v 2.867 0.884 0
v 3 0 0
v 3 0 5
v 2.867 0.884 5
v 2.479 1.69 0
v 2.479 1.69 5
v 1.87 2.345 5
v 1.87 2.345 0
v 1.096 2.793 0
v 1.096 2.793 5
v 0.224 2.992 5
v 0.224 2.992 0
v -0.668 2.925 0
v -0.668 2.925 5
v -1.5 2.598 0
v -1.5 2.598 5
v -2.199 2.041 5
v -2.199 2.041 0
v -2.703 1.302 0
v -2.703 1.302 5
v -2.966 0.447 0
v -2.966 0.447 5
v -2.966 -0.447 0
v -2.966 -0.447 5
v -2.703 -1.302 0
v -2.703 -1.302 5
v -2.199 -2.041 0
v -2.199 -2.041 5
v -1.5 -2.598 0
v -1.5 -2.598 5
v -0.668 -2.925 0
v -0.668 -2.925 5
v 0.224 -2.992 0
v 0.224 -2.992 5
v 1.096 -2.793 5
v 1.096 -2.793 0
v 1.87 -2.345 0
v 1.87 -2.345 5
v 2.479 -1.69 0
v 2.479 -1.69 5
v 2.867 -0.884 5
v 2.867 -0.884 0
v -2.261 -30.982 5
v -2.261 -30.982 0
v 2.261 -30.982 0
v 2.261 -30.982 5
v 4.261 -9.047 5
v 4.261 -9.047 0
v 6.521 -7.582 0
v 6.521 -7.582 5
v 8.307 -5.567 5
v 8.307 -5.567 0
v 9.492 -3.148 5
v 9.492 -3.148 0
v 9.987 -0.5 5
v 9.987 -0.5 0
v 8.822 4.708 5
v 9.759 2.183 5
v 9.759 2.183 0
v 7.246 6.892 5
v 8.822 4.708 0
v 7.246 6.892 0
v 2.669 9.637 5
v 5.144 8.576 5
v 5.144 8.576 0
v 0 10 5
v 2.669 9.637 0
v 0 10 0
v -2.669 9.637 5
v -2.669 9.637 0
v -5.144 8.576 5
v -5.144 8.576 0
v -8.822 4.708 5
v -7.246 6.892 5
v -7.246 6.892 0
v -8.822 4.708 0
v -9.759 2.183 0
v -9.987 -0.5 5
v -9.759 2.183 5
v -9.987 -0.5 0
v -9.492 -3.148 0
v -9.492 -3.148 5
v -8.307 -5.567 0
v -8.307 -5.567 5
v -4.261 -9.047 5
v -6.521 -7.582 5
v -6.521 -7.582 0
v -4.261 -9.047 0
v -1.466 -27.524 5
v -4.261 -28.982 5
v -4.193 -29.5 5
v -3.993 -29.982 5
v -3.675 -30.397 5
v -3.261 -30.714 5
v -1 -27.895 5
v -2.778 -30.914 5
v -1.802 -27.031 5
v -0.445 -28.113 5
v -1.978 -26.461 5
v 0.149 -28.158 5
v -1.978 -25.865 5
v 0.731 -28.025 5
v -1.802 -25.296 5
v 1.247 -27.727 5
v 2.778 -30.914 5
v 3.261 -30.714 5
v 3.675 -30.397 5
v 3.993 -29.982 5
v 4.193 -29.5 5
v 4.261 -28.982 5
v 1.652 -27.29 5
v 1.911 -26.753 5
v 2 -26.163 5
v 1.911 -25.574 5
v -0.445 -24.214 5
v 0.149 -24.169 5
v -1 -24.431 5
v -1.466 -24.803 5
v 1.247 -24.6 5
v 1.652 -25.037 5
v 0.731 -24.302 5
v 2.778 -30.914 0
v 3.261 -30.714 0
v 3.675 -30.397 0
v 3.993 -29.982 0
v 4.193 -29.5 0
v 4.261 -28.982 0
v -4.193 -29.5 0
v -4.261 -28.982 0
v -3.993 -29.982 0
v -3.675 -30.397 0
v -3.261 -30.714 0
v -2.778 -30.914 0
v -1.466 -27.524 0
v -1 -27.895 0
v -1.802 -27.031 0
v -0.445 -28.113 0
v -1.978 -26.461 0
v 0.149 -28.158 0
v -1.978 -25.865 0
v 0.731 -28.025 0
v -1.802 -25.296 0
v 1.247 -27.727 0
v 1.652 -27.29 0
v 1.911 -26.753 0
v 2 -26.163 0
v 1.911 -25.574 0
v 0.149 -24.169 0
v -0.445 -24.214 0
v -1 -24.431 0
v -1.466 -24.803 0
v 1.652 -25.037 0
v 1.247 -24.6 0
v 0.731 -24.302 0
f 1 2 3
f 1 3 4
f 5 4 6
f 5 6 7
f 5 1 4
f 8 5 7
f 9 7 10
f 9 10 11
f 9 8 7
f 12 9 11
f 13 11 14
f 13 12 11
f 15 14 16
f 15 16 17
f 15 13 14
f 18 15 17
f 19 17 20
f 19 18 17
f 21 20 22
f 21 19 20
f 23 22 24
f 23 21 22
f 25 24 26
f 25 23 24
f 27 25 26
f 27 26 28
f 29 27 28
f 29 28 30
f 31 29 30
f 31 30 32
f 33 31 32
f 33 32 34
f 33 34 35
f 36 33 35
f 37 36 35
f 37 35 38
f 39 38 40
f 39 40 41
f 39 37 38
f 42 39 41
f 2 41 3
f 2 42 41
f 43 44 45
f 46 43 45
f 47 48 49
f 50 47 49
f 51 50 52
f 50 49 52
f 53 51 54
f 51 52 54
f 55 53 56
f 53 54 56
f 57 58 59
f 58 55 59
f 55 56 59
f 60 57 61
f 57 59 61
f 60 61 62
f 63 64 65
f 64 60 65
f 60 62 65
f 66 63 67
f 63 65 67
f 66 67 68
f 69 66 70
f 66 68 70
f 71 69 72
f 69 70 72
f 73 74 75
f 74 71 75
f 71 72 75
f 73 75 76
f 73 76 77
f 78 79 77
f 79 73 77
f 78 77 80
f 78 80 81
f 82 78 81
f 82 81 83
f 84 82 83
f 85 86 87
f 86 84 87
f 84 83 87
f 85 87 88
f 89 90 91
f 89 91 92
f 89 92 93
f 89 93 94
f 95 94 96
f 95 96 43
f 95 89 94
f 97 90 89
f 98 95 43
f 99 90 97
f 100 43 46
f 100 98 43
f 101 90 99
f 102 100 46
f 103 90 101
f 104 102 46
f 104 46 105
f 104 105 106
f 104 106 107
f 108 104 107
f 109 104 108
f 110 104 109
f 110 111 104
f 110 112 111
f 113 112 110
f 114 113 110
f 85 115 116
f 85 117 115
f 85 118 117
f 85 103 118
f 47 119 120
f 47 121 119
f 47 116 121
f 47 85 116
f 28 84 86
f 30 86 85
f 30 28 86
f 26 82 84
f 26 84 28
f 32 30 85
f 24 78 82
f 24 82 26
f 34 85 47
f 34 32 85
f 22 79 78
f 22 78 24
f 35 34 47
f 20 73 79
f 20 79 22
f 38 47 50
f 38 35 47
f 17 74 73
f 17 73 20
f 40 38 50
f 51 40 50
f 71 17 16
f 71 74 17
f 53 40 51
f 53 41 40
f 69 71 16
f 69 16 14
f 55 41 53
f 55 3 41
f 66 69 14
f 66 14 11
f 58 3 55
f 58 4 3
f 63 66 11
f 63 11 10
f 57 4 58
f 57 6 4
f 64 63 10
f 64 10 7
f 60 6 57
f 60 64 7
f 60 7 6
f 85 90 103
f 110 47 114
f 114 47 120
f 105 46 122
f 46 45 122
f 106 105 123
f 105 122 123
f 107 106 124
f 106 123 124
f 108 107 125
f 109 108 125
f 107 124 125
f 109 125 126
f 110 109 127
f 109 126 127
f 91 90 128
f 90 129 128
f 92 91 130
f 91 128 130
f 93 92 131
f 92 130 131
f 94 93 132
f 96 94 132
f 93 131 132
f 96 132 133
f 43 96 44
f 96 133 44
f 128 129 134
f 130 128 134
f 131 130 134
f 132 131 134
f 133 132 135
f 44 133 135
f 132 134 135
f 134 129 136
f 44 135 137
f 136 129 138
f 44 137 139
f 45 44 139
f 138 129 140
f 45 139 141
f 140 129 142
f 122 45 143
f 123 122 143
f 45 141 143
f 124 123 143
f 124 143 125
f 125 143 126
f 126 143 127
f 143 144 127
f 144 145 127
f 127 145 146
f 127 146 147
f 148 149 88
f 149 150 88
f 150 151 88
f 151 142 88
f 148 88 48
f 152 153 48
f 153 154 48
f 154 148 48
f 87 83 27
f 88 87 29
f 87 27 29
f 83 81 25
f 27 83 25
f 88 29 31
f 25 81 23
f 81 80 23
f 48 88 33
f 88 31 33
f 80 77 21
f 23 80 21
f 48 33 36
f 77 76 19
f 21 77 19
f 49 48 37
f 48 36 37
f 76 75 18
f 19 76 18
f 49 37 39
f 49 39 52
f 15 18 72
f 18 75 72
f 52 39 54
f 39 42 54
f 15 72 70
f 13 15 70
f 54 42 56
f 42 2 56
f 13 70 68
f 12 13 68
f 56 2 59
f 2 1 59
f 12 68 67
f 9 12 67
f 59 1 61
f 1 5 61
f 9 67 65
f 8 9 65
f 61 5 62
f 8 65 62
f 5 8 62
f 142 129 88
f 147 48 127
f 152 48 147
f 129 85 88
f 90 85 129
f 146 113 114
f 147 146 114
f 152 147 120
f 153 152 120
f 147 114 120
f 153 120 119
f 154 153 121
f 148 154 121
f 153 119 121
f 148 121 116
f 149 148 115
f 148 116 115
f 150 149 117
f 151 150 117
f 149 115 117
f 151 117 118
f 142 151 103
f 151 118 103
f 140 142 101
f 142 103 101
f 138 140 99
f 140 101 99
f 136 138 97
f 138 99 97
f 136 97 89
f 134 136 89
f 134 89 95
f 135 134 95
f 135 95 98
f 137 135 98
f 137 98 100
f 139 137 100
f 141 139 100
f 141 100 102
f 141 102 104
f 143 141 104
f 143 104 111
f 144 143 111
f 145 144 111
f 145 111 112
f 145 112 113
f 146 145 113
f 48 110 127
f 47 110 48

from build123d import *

# Parameters (mm, degrees)
F0_R     = 10
F0_R_2   = 3
F1_DEPTH = 5
F3_DEPTH = 5
F4_R     = 2
F5_R     = 2
F6_DEPTH = 5.001


with BuildPart() as f1:
    # F0 (on Top) → F1 (new body)
    with BuildSketch(Plane.XY):
        Circle(F0_R)
        Circle(F0_R_2, mode=Mode.SUBTRACT)
    extrude(amount=F1_DEPTH)

    # F2 (on face) → F3 (join)
    with BuildSketch(Plane.XY.offset(5)):
        with BuildLine():
            Line((4.2607685338, -30.9823937714), (4.2607685338, -9.0468697073))
            ThreePointArc((4.2607685338, -9.0468697073), (0, -10), (-4.2607685338, -9.0468697073))
            Line((-4.2607685338, -9.0468697073), (-4.2607685338, -30.9823937714))
            Line((-4.2607685338, -30.9823937714), (4.2607685338, -30.9823937714))
        make_face()
    extrude(amount=-F3_DEPTH)

    # F4
    f4_edges = [f1.edges().sort_by_distance(p)[0] for p in [
        (-4.260769, -30.982394, 2.5),
        (4.260769, -30.982394, 2.5),
    ]]
    fillet(f4_edges, radius=F4_R)

    # F5 (on face) → F6 (cut, through all)
    with BuildSketch(Plane.XY.offset(5)):
        with Locations((0, -26.1633973569)):
            Circle(F5_R)
    extrude(amount=-F6_DEPTH, mode=Mode.SUBTRACT)


solid = f1.part
